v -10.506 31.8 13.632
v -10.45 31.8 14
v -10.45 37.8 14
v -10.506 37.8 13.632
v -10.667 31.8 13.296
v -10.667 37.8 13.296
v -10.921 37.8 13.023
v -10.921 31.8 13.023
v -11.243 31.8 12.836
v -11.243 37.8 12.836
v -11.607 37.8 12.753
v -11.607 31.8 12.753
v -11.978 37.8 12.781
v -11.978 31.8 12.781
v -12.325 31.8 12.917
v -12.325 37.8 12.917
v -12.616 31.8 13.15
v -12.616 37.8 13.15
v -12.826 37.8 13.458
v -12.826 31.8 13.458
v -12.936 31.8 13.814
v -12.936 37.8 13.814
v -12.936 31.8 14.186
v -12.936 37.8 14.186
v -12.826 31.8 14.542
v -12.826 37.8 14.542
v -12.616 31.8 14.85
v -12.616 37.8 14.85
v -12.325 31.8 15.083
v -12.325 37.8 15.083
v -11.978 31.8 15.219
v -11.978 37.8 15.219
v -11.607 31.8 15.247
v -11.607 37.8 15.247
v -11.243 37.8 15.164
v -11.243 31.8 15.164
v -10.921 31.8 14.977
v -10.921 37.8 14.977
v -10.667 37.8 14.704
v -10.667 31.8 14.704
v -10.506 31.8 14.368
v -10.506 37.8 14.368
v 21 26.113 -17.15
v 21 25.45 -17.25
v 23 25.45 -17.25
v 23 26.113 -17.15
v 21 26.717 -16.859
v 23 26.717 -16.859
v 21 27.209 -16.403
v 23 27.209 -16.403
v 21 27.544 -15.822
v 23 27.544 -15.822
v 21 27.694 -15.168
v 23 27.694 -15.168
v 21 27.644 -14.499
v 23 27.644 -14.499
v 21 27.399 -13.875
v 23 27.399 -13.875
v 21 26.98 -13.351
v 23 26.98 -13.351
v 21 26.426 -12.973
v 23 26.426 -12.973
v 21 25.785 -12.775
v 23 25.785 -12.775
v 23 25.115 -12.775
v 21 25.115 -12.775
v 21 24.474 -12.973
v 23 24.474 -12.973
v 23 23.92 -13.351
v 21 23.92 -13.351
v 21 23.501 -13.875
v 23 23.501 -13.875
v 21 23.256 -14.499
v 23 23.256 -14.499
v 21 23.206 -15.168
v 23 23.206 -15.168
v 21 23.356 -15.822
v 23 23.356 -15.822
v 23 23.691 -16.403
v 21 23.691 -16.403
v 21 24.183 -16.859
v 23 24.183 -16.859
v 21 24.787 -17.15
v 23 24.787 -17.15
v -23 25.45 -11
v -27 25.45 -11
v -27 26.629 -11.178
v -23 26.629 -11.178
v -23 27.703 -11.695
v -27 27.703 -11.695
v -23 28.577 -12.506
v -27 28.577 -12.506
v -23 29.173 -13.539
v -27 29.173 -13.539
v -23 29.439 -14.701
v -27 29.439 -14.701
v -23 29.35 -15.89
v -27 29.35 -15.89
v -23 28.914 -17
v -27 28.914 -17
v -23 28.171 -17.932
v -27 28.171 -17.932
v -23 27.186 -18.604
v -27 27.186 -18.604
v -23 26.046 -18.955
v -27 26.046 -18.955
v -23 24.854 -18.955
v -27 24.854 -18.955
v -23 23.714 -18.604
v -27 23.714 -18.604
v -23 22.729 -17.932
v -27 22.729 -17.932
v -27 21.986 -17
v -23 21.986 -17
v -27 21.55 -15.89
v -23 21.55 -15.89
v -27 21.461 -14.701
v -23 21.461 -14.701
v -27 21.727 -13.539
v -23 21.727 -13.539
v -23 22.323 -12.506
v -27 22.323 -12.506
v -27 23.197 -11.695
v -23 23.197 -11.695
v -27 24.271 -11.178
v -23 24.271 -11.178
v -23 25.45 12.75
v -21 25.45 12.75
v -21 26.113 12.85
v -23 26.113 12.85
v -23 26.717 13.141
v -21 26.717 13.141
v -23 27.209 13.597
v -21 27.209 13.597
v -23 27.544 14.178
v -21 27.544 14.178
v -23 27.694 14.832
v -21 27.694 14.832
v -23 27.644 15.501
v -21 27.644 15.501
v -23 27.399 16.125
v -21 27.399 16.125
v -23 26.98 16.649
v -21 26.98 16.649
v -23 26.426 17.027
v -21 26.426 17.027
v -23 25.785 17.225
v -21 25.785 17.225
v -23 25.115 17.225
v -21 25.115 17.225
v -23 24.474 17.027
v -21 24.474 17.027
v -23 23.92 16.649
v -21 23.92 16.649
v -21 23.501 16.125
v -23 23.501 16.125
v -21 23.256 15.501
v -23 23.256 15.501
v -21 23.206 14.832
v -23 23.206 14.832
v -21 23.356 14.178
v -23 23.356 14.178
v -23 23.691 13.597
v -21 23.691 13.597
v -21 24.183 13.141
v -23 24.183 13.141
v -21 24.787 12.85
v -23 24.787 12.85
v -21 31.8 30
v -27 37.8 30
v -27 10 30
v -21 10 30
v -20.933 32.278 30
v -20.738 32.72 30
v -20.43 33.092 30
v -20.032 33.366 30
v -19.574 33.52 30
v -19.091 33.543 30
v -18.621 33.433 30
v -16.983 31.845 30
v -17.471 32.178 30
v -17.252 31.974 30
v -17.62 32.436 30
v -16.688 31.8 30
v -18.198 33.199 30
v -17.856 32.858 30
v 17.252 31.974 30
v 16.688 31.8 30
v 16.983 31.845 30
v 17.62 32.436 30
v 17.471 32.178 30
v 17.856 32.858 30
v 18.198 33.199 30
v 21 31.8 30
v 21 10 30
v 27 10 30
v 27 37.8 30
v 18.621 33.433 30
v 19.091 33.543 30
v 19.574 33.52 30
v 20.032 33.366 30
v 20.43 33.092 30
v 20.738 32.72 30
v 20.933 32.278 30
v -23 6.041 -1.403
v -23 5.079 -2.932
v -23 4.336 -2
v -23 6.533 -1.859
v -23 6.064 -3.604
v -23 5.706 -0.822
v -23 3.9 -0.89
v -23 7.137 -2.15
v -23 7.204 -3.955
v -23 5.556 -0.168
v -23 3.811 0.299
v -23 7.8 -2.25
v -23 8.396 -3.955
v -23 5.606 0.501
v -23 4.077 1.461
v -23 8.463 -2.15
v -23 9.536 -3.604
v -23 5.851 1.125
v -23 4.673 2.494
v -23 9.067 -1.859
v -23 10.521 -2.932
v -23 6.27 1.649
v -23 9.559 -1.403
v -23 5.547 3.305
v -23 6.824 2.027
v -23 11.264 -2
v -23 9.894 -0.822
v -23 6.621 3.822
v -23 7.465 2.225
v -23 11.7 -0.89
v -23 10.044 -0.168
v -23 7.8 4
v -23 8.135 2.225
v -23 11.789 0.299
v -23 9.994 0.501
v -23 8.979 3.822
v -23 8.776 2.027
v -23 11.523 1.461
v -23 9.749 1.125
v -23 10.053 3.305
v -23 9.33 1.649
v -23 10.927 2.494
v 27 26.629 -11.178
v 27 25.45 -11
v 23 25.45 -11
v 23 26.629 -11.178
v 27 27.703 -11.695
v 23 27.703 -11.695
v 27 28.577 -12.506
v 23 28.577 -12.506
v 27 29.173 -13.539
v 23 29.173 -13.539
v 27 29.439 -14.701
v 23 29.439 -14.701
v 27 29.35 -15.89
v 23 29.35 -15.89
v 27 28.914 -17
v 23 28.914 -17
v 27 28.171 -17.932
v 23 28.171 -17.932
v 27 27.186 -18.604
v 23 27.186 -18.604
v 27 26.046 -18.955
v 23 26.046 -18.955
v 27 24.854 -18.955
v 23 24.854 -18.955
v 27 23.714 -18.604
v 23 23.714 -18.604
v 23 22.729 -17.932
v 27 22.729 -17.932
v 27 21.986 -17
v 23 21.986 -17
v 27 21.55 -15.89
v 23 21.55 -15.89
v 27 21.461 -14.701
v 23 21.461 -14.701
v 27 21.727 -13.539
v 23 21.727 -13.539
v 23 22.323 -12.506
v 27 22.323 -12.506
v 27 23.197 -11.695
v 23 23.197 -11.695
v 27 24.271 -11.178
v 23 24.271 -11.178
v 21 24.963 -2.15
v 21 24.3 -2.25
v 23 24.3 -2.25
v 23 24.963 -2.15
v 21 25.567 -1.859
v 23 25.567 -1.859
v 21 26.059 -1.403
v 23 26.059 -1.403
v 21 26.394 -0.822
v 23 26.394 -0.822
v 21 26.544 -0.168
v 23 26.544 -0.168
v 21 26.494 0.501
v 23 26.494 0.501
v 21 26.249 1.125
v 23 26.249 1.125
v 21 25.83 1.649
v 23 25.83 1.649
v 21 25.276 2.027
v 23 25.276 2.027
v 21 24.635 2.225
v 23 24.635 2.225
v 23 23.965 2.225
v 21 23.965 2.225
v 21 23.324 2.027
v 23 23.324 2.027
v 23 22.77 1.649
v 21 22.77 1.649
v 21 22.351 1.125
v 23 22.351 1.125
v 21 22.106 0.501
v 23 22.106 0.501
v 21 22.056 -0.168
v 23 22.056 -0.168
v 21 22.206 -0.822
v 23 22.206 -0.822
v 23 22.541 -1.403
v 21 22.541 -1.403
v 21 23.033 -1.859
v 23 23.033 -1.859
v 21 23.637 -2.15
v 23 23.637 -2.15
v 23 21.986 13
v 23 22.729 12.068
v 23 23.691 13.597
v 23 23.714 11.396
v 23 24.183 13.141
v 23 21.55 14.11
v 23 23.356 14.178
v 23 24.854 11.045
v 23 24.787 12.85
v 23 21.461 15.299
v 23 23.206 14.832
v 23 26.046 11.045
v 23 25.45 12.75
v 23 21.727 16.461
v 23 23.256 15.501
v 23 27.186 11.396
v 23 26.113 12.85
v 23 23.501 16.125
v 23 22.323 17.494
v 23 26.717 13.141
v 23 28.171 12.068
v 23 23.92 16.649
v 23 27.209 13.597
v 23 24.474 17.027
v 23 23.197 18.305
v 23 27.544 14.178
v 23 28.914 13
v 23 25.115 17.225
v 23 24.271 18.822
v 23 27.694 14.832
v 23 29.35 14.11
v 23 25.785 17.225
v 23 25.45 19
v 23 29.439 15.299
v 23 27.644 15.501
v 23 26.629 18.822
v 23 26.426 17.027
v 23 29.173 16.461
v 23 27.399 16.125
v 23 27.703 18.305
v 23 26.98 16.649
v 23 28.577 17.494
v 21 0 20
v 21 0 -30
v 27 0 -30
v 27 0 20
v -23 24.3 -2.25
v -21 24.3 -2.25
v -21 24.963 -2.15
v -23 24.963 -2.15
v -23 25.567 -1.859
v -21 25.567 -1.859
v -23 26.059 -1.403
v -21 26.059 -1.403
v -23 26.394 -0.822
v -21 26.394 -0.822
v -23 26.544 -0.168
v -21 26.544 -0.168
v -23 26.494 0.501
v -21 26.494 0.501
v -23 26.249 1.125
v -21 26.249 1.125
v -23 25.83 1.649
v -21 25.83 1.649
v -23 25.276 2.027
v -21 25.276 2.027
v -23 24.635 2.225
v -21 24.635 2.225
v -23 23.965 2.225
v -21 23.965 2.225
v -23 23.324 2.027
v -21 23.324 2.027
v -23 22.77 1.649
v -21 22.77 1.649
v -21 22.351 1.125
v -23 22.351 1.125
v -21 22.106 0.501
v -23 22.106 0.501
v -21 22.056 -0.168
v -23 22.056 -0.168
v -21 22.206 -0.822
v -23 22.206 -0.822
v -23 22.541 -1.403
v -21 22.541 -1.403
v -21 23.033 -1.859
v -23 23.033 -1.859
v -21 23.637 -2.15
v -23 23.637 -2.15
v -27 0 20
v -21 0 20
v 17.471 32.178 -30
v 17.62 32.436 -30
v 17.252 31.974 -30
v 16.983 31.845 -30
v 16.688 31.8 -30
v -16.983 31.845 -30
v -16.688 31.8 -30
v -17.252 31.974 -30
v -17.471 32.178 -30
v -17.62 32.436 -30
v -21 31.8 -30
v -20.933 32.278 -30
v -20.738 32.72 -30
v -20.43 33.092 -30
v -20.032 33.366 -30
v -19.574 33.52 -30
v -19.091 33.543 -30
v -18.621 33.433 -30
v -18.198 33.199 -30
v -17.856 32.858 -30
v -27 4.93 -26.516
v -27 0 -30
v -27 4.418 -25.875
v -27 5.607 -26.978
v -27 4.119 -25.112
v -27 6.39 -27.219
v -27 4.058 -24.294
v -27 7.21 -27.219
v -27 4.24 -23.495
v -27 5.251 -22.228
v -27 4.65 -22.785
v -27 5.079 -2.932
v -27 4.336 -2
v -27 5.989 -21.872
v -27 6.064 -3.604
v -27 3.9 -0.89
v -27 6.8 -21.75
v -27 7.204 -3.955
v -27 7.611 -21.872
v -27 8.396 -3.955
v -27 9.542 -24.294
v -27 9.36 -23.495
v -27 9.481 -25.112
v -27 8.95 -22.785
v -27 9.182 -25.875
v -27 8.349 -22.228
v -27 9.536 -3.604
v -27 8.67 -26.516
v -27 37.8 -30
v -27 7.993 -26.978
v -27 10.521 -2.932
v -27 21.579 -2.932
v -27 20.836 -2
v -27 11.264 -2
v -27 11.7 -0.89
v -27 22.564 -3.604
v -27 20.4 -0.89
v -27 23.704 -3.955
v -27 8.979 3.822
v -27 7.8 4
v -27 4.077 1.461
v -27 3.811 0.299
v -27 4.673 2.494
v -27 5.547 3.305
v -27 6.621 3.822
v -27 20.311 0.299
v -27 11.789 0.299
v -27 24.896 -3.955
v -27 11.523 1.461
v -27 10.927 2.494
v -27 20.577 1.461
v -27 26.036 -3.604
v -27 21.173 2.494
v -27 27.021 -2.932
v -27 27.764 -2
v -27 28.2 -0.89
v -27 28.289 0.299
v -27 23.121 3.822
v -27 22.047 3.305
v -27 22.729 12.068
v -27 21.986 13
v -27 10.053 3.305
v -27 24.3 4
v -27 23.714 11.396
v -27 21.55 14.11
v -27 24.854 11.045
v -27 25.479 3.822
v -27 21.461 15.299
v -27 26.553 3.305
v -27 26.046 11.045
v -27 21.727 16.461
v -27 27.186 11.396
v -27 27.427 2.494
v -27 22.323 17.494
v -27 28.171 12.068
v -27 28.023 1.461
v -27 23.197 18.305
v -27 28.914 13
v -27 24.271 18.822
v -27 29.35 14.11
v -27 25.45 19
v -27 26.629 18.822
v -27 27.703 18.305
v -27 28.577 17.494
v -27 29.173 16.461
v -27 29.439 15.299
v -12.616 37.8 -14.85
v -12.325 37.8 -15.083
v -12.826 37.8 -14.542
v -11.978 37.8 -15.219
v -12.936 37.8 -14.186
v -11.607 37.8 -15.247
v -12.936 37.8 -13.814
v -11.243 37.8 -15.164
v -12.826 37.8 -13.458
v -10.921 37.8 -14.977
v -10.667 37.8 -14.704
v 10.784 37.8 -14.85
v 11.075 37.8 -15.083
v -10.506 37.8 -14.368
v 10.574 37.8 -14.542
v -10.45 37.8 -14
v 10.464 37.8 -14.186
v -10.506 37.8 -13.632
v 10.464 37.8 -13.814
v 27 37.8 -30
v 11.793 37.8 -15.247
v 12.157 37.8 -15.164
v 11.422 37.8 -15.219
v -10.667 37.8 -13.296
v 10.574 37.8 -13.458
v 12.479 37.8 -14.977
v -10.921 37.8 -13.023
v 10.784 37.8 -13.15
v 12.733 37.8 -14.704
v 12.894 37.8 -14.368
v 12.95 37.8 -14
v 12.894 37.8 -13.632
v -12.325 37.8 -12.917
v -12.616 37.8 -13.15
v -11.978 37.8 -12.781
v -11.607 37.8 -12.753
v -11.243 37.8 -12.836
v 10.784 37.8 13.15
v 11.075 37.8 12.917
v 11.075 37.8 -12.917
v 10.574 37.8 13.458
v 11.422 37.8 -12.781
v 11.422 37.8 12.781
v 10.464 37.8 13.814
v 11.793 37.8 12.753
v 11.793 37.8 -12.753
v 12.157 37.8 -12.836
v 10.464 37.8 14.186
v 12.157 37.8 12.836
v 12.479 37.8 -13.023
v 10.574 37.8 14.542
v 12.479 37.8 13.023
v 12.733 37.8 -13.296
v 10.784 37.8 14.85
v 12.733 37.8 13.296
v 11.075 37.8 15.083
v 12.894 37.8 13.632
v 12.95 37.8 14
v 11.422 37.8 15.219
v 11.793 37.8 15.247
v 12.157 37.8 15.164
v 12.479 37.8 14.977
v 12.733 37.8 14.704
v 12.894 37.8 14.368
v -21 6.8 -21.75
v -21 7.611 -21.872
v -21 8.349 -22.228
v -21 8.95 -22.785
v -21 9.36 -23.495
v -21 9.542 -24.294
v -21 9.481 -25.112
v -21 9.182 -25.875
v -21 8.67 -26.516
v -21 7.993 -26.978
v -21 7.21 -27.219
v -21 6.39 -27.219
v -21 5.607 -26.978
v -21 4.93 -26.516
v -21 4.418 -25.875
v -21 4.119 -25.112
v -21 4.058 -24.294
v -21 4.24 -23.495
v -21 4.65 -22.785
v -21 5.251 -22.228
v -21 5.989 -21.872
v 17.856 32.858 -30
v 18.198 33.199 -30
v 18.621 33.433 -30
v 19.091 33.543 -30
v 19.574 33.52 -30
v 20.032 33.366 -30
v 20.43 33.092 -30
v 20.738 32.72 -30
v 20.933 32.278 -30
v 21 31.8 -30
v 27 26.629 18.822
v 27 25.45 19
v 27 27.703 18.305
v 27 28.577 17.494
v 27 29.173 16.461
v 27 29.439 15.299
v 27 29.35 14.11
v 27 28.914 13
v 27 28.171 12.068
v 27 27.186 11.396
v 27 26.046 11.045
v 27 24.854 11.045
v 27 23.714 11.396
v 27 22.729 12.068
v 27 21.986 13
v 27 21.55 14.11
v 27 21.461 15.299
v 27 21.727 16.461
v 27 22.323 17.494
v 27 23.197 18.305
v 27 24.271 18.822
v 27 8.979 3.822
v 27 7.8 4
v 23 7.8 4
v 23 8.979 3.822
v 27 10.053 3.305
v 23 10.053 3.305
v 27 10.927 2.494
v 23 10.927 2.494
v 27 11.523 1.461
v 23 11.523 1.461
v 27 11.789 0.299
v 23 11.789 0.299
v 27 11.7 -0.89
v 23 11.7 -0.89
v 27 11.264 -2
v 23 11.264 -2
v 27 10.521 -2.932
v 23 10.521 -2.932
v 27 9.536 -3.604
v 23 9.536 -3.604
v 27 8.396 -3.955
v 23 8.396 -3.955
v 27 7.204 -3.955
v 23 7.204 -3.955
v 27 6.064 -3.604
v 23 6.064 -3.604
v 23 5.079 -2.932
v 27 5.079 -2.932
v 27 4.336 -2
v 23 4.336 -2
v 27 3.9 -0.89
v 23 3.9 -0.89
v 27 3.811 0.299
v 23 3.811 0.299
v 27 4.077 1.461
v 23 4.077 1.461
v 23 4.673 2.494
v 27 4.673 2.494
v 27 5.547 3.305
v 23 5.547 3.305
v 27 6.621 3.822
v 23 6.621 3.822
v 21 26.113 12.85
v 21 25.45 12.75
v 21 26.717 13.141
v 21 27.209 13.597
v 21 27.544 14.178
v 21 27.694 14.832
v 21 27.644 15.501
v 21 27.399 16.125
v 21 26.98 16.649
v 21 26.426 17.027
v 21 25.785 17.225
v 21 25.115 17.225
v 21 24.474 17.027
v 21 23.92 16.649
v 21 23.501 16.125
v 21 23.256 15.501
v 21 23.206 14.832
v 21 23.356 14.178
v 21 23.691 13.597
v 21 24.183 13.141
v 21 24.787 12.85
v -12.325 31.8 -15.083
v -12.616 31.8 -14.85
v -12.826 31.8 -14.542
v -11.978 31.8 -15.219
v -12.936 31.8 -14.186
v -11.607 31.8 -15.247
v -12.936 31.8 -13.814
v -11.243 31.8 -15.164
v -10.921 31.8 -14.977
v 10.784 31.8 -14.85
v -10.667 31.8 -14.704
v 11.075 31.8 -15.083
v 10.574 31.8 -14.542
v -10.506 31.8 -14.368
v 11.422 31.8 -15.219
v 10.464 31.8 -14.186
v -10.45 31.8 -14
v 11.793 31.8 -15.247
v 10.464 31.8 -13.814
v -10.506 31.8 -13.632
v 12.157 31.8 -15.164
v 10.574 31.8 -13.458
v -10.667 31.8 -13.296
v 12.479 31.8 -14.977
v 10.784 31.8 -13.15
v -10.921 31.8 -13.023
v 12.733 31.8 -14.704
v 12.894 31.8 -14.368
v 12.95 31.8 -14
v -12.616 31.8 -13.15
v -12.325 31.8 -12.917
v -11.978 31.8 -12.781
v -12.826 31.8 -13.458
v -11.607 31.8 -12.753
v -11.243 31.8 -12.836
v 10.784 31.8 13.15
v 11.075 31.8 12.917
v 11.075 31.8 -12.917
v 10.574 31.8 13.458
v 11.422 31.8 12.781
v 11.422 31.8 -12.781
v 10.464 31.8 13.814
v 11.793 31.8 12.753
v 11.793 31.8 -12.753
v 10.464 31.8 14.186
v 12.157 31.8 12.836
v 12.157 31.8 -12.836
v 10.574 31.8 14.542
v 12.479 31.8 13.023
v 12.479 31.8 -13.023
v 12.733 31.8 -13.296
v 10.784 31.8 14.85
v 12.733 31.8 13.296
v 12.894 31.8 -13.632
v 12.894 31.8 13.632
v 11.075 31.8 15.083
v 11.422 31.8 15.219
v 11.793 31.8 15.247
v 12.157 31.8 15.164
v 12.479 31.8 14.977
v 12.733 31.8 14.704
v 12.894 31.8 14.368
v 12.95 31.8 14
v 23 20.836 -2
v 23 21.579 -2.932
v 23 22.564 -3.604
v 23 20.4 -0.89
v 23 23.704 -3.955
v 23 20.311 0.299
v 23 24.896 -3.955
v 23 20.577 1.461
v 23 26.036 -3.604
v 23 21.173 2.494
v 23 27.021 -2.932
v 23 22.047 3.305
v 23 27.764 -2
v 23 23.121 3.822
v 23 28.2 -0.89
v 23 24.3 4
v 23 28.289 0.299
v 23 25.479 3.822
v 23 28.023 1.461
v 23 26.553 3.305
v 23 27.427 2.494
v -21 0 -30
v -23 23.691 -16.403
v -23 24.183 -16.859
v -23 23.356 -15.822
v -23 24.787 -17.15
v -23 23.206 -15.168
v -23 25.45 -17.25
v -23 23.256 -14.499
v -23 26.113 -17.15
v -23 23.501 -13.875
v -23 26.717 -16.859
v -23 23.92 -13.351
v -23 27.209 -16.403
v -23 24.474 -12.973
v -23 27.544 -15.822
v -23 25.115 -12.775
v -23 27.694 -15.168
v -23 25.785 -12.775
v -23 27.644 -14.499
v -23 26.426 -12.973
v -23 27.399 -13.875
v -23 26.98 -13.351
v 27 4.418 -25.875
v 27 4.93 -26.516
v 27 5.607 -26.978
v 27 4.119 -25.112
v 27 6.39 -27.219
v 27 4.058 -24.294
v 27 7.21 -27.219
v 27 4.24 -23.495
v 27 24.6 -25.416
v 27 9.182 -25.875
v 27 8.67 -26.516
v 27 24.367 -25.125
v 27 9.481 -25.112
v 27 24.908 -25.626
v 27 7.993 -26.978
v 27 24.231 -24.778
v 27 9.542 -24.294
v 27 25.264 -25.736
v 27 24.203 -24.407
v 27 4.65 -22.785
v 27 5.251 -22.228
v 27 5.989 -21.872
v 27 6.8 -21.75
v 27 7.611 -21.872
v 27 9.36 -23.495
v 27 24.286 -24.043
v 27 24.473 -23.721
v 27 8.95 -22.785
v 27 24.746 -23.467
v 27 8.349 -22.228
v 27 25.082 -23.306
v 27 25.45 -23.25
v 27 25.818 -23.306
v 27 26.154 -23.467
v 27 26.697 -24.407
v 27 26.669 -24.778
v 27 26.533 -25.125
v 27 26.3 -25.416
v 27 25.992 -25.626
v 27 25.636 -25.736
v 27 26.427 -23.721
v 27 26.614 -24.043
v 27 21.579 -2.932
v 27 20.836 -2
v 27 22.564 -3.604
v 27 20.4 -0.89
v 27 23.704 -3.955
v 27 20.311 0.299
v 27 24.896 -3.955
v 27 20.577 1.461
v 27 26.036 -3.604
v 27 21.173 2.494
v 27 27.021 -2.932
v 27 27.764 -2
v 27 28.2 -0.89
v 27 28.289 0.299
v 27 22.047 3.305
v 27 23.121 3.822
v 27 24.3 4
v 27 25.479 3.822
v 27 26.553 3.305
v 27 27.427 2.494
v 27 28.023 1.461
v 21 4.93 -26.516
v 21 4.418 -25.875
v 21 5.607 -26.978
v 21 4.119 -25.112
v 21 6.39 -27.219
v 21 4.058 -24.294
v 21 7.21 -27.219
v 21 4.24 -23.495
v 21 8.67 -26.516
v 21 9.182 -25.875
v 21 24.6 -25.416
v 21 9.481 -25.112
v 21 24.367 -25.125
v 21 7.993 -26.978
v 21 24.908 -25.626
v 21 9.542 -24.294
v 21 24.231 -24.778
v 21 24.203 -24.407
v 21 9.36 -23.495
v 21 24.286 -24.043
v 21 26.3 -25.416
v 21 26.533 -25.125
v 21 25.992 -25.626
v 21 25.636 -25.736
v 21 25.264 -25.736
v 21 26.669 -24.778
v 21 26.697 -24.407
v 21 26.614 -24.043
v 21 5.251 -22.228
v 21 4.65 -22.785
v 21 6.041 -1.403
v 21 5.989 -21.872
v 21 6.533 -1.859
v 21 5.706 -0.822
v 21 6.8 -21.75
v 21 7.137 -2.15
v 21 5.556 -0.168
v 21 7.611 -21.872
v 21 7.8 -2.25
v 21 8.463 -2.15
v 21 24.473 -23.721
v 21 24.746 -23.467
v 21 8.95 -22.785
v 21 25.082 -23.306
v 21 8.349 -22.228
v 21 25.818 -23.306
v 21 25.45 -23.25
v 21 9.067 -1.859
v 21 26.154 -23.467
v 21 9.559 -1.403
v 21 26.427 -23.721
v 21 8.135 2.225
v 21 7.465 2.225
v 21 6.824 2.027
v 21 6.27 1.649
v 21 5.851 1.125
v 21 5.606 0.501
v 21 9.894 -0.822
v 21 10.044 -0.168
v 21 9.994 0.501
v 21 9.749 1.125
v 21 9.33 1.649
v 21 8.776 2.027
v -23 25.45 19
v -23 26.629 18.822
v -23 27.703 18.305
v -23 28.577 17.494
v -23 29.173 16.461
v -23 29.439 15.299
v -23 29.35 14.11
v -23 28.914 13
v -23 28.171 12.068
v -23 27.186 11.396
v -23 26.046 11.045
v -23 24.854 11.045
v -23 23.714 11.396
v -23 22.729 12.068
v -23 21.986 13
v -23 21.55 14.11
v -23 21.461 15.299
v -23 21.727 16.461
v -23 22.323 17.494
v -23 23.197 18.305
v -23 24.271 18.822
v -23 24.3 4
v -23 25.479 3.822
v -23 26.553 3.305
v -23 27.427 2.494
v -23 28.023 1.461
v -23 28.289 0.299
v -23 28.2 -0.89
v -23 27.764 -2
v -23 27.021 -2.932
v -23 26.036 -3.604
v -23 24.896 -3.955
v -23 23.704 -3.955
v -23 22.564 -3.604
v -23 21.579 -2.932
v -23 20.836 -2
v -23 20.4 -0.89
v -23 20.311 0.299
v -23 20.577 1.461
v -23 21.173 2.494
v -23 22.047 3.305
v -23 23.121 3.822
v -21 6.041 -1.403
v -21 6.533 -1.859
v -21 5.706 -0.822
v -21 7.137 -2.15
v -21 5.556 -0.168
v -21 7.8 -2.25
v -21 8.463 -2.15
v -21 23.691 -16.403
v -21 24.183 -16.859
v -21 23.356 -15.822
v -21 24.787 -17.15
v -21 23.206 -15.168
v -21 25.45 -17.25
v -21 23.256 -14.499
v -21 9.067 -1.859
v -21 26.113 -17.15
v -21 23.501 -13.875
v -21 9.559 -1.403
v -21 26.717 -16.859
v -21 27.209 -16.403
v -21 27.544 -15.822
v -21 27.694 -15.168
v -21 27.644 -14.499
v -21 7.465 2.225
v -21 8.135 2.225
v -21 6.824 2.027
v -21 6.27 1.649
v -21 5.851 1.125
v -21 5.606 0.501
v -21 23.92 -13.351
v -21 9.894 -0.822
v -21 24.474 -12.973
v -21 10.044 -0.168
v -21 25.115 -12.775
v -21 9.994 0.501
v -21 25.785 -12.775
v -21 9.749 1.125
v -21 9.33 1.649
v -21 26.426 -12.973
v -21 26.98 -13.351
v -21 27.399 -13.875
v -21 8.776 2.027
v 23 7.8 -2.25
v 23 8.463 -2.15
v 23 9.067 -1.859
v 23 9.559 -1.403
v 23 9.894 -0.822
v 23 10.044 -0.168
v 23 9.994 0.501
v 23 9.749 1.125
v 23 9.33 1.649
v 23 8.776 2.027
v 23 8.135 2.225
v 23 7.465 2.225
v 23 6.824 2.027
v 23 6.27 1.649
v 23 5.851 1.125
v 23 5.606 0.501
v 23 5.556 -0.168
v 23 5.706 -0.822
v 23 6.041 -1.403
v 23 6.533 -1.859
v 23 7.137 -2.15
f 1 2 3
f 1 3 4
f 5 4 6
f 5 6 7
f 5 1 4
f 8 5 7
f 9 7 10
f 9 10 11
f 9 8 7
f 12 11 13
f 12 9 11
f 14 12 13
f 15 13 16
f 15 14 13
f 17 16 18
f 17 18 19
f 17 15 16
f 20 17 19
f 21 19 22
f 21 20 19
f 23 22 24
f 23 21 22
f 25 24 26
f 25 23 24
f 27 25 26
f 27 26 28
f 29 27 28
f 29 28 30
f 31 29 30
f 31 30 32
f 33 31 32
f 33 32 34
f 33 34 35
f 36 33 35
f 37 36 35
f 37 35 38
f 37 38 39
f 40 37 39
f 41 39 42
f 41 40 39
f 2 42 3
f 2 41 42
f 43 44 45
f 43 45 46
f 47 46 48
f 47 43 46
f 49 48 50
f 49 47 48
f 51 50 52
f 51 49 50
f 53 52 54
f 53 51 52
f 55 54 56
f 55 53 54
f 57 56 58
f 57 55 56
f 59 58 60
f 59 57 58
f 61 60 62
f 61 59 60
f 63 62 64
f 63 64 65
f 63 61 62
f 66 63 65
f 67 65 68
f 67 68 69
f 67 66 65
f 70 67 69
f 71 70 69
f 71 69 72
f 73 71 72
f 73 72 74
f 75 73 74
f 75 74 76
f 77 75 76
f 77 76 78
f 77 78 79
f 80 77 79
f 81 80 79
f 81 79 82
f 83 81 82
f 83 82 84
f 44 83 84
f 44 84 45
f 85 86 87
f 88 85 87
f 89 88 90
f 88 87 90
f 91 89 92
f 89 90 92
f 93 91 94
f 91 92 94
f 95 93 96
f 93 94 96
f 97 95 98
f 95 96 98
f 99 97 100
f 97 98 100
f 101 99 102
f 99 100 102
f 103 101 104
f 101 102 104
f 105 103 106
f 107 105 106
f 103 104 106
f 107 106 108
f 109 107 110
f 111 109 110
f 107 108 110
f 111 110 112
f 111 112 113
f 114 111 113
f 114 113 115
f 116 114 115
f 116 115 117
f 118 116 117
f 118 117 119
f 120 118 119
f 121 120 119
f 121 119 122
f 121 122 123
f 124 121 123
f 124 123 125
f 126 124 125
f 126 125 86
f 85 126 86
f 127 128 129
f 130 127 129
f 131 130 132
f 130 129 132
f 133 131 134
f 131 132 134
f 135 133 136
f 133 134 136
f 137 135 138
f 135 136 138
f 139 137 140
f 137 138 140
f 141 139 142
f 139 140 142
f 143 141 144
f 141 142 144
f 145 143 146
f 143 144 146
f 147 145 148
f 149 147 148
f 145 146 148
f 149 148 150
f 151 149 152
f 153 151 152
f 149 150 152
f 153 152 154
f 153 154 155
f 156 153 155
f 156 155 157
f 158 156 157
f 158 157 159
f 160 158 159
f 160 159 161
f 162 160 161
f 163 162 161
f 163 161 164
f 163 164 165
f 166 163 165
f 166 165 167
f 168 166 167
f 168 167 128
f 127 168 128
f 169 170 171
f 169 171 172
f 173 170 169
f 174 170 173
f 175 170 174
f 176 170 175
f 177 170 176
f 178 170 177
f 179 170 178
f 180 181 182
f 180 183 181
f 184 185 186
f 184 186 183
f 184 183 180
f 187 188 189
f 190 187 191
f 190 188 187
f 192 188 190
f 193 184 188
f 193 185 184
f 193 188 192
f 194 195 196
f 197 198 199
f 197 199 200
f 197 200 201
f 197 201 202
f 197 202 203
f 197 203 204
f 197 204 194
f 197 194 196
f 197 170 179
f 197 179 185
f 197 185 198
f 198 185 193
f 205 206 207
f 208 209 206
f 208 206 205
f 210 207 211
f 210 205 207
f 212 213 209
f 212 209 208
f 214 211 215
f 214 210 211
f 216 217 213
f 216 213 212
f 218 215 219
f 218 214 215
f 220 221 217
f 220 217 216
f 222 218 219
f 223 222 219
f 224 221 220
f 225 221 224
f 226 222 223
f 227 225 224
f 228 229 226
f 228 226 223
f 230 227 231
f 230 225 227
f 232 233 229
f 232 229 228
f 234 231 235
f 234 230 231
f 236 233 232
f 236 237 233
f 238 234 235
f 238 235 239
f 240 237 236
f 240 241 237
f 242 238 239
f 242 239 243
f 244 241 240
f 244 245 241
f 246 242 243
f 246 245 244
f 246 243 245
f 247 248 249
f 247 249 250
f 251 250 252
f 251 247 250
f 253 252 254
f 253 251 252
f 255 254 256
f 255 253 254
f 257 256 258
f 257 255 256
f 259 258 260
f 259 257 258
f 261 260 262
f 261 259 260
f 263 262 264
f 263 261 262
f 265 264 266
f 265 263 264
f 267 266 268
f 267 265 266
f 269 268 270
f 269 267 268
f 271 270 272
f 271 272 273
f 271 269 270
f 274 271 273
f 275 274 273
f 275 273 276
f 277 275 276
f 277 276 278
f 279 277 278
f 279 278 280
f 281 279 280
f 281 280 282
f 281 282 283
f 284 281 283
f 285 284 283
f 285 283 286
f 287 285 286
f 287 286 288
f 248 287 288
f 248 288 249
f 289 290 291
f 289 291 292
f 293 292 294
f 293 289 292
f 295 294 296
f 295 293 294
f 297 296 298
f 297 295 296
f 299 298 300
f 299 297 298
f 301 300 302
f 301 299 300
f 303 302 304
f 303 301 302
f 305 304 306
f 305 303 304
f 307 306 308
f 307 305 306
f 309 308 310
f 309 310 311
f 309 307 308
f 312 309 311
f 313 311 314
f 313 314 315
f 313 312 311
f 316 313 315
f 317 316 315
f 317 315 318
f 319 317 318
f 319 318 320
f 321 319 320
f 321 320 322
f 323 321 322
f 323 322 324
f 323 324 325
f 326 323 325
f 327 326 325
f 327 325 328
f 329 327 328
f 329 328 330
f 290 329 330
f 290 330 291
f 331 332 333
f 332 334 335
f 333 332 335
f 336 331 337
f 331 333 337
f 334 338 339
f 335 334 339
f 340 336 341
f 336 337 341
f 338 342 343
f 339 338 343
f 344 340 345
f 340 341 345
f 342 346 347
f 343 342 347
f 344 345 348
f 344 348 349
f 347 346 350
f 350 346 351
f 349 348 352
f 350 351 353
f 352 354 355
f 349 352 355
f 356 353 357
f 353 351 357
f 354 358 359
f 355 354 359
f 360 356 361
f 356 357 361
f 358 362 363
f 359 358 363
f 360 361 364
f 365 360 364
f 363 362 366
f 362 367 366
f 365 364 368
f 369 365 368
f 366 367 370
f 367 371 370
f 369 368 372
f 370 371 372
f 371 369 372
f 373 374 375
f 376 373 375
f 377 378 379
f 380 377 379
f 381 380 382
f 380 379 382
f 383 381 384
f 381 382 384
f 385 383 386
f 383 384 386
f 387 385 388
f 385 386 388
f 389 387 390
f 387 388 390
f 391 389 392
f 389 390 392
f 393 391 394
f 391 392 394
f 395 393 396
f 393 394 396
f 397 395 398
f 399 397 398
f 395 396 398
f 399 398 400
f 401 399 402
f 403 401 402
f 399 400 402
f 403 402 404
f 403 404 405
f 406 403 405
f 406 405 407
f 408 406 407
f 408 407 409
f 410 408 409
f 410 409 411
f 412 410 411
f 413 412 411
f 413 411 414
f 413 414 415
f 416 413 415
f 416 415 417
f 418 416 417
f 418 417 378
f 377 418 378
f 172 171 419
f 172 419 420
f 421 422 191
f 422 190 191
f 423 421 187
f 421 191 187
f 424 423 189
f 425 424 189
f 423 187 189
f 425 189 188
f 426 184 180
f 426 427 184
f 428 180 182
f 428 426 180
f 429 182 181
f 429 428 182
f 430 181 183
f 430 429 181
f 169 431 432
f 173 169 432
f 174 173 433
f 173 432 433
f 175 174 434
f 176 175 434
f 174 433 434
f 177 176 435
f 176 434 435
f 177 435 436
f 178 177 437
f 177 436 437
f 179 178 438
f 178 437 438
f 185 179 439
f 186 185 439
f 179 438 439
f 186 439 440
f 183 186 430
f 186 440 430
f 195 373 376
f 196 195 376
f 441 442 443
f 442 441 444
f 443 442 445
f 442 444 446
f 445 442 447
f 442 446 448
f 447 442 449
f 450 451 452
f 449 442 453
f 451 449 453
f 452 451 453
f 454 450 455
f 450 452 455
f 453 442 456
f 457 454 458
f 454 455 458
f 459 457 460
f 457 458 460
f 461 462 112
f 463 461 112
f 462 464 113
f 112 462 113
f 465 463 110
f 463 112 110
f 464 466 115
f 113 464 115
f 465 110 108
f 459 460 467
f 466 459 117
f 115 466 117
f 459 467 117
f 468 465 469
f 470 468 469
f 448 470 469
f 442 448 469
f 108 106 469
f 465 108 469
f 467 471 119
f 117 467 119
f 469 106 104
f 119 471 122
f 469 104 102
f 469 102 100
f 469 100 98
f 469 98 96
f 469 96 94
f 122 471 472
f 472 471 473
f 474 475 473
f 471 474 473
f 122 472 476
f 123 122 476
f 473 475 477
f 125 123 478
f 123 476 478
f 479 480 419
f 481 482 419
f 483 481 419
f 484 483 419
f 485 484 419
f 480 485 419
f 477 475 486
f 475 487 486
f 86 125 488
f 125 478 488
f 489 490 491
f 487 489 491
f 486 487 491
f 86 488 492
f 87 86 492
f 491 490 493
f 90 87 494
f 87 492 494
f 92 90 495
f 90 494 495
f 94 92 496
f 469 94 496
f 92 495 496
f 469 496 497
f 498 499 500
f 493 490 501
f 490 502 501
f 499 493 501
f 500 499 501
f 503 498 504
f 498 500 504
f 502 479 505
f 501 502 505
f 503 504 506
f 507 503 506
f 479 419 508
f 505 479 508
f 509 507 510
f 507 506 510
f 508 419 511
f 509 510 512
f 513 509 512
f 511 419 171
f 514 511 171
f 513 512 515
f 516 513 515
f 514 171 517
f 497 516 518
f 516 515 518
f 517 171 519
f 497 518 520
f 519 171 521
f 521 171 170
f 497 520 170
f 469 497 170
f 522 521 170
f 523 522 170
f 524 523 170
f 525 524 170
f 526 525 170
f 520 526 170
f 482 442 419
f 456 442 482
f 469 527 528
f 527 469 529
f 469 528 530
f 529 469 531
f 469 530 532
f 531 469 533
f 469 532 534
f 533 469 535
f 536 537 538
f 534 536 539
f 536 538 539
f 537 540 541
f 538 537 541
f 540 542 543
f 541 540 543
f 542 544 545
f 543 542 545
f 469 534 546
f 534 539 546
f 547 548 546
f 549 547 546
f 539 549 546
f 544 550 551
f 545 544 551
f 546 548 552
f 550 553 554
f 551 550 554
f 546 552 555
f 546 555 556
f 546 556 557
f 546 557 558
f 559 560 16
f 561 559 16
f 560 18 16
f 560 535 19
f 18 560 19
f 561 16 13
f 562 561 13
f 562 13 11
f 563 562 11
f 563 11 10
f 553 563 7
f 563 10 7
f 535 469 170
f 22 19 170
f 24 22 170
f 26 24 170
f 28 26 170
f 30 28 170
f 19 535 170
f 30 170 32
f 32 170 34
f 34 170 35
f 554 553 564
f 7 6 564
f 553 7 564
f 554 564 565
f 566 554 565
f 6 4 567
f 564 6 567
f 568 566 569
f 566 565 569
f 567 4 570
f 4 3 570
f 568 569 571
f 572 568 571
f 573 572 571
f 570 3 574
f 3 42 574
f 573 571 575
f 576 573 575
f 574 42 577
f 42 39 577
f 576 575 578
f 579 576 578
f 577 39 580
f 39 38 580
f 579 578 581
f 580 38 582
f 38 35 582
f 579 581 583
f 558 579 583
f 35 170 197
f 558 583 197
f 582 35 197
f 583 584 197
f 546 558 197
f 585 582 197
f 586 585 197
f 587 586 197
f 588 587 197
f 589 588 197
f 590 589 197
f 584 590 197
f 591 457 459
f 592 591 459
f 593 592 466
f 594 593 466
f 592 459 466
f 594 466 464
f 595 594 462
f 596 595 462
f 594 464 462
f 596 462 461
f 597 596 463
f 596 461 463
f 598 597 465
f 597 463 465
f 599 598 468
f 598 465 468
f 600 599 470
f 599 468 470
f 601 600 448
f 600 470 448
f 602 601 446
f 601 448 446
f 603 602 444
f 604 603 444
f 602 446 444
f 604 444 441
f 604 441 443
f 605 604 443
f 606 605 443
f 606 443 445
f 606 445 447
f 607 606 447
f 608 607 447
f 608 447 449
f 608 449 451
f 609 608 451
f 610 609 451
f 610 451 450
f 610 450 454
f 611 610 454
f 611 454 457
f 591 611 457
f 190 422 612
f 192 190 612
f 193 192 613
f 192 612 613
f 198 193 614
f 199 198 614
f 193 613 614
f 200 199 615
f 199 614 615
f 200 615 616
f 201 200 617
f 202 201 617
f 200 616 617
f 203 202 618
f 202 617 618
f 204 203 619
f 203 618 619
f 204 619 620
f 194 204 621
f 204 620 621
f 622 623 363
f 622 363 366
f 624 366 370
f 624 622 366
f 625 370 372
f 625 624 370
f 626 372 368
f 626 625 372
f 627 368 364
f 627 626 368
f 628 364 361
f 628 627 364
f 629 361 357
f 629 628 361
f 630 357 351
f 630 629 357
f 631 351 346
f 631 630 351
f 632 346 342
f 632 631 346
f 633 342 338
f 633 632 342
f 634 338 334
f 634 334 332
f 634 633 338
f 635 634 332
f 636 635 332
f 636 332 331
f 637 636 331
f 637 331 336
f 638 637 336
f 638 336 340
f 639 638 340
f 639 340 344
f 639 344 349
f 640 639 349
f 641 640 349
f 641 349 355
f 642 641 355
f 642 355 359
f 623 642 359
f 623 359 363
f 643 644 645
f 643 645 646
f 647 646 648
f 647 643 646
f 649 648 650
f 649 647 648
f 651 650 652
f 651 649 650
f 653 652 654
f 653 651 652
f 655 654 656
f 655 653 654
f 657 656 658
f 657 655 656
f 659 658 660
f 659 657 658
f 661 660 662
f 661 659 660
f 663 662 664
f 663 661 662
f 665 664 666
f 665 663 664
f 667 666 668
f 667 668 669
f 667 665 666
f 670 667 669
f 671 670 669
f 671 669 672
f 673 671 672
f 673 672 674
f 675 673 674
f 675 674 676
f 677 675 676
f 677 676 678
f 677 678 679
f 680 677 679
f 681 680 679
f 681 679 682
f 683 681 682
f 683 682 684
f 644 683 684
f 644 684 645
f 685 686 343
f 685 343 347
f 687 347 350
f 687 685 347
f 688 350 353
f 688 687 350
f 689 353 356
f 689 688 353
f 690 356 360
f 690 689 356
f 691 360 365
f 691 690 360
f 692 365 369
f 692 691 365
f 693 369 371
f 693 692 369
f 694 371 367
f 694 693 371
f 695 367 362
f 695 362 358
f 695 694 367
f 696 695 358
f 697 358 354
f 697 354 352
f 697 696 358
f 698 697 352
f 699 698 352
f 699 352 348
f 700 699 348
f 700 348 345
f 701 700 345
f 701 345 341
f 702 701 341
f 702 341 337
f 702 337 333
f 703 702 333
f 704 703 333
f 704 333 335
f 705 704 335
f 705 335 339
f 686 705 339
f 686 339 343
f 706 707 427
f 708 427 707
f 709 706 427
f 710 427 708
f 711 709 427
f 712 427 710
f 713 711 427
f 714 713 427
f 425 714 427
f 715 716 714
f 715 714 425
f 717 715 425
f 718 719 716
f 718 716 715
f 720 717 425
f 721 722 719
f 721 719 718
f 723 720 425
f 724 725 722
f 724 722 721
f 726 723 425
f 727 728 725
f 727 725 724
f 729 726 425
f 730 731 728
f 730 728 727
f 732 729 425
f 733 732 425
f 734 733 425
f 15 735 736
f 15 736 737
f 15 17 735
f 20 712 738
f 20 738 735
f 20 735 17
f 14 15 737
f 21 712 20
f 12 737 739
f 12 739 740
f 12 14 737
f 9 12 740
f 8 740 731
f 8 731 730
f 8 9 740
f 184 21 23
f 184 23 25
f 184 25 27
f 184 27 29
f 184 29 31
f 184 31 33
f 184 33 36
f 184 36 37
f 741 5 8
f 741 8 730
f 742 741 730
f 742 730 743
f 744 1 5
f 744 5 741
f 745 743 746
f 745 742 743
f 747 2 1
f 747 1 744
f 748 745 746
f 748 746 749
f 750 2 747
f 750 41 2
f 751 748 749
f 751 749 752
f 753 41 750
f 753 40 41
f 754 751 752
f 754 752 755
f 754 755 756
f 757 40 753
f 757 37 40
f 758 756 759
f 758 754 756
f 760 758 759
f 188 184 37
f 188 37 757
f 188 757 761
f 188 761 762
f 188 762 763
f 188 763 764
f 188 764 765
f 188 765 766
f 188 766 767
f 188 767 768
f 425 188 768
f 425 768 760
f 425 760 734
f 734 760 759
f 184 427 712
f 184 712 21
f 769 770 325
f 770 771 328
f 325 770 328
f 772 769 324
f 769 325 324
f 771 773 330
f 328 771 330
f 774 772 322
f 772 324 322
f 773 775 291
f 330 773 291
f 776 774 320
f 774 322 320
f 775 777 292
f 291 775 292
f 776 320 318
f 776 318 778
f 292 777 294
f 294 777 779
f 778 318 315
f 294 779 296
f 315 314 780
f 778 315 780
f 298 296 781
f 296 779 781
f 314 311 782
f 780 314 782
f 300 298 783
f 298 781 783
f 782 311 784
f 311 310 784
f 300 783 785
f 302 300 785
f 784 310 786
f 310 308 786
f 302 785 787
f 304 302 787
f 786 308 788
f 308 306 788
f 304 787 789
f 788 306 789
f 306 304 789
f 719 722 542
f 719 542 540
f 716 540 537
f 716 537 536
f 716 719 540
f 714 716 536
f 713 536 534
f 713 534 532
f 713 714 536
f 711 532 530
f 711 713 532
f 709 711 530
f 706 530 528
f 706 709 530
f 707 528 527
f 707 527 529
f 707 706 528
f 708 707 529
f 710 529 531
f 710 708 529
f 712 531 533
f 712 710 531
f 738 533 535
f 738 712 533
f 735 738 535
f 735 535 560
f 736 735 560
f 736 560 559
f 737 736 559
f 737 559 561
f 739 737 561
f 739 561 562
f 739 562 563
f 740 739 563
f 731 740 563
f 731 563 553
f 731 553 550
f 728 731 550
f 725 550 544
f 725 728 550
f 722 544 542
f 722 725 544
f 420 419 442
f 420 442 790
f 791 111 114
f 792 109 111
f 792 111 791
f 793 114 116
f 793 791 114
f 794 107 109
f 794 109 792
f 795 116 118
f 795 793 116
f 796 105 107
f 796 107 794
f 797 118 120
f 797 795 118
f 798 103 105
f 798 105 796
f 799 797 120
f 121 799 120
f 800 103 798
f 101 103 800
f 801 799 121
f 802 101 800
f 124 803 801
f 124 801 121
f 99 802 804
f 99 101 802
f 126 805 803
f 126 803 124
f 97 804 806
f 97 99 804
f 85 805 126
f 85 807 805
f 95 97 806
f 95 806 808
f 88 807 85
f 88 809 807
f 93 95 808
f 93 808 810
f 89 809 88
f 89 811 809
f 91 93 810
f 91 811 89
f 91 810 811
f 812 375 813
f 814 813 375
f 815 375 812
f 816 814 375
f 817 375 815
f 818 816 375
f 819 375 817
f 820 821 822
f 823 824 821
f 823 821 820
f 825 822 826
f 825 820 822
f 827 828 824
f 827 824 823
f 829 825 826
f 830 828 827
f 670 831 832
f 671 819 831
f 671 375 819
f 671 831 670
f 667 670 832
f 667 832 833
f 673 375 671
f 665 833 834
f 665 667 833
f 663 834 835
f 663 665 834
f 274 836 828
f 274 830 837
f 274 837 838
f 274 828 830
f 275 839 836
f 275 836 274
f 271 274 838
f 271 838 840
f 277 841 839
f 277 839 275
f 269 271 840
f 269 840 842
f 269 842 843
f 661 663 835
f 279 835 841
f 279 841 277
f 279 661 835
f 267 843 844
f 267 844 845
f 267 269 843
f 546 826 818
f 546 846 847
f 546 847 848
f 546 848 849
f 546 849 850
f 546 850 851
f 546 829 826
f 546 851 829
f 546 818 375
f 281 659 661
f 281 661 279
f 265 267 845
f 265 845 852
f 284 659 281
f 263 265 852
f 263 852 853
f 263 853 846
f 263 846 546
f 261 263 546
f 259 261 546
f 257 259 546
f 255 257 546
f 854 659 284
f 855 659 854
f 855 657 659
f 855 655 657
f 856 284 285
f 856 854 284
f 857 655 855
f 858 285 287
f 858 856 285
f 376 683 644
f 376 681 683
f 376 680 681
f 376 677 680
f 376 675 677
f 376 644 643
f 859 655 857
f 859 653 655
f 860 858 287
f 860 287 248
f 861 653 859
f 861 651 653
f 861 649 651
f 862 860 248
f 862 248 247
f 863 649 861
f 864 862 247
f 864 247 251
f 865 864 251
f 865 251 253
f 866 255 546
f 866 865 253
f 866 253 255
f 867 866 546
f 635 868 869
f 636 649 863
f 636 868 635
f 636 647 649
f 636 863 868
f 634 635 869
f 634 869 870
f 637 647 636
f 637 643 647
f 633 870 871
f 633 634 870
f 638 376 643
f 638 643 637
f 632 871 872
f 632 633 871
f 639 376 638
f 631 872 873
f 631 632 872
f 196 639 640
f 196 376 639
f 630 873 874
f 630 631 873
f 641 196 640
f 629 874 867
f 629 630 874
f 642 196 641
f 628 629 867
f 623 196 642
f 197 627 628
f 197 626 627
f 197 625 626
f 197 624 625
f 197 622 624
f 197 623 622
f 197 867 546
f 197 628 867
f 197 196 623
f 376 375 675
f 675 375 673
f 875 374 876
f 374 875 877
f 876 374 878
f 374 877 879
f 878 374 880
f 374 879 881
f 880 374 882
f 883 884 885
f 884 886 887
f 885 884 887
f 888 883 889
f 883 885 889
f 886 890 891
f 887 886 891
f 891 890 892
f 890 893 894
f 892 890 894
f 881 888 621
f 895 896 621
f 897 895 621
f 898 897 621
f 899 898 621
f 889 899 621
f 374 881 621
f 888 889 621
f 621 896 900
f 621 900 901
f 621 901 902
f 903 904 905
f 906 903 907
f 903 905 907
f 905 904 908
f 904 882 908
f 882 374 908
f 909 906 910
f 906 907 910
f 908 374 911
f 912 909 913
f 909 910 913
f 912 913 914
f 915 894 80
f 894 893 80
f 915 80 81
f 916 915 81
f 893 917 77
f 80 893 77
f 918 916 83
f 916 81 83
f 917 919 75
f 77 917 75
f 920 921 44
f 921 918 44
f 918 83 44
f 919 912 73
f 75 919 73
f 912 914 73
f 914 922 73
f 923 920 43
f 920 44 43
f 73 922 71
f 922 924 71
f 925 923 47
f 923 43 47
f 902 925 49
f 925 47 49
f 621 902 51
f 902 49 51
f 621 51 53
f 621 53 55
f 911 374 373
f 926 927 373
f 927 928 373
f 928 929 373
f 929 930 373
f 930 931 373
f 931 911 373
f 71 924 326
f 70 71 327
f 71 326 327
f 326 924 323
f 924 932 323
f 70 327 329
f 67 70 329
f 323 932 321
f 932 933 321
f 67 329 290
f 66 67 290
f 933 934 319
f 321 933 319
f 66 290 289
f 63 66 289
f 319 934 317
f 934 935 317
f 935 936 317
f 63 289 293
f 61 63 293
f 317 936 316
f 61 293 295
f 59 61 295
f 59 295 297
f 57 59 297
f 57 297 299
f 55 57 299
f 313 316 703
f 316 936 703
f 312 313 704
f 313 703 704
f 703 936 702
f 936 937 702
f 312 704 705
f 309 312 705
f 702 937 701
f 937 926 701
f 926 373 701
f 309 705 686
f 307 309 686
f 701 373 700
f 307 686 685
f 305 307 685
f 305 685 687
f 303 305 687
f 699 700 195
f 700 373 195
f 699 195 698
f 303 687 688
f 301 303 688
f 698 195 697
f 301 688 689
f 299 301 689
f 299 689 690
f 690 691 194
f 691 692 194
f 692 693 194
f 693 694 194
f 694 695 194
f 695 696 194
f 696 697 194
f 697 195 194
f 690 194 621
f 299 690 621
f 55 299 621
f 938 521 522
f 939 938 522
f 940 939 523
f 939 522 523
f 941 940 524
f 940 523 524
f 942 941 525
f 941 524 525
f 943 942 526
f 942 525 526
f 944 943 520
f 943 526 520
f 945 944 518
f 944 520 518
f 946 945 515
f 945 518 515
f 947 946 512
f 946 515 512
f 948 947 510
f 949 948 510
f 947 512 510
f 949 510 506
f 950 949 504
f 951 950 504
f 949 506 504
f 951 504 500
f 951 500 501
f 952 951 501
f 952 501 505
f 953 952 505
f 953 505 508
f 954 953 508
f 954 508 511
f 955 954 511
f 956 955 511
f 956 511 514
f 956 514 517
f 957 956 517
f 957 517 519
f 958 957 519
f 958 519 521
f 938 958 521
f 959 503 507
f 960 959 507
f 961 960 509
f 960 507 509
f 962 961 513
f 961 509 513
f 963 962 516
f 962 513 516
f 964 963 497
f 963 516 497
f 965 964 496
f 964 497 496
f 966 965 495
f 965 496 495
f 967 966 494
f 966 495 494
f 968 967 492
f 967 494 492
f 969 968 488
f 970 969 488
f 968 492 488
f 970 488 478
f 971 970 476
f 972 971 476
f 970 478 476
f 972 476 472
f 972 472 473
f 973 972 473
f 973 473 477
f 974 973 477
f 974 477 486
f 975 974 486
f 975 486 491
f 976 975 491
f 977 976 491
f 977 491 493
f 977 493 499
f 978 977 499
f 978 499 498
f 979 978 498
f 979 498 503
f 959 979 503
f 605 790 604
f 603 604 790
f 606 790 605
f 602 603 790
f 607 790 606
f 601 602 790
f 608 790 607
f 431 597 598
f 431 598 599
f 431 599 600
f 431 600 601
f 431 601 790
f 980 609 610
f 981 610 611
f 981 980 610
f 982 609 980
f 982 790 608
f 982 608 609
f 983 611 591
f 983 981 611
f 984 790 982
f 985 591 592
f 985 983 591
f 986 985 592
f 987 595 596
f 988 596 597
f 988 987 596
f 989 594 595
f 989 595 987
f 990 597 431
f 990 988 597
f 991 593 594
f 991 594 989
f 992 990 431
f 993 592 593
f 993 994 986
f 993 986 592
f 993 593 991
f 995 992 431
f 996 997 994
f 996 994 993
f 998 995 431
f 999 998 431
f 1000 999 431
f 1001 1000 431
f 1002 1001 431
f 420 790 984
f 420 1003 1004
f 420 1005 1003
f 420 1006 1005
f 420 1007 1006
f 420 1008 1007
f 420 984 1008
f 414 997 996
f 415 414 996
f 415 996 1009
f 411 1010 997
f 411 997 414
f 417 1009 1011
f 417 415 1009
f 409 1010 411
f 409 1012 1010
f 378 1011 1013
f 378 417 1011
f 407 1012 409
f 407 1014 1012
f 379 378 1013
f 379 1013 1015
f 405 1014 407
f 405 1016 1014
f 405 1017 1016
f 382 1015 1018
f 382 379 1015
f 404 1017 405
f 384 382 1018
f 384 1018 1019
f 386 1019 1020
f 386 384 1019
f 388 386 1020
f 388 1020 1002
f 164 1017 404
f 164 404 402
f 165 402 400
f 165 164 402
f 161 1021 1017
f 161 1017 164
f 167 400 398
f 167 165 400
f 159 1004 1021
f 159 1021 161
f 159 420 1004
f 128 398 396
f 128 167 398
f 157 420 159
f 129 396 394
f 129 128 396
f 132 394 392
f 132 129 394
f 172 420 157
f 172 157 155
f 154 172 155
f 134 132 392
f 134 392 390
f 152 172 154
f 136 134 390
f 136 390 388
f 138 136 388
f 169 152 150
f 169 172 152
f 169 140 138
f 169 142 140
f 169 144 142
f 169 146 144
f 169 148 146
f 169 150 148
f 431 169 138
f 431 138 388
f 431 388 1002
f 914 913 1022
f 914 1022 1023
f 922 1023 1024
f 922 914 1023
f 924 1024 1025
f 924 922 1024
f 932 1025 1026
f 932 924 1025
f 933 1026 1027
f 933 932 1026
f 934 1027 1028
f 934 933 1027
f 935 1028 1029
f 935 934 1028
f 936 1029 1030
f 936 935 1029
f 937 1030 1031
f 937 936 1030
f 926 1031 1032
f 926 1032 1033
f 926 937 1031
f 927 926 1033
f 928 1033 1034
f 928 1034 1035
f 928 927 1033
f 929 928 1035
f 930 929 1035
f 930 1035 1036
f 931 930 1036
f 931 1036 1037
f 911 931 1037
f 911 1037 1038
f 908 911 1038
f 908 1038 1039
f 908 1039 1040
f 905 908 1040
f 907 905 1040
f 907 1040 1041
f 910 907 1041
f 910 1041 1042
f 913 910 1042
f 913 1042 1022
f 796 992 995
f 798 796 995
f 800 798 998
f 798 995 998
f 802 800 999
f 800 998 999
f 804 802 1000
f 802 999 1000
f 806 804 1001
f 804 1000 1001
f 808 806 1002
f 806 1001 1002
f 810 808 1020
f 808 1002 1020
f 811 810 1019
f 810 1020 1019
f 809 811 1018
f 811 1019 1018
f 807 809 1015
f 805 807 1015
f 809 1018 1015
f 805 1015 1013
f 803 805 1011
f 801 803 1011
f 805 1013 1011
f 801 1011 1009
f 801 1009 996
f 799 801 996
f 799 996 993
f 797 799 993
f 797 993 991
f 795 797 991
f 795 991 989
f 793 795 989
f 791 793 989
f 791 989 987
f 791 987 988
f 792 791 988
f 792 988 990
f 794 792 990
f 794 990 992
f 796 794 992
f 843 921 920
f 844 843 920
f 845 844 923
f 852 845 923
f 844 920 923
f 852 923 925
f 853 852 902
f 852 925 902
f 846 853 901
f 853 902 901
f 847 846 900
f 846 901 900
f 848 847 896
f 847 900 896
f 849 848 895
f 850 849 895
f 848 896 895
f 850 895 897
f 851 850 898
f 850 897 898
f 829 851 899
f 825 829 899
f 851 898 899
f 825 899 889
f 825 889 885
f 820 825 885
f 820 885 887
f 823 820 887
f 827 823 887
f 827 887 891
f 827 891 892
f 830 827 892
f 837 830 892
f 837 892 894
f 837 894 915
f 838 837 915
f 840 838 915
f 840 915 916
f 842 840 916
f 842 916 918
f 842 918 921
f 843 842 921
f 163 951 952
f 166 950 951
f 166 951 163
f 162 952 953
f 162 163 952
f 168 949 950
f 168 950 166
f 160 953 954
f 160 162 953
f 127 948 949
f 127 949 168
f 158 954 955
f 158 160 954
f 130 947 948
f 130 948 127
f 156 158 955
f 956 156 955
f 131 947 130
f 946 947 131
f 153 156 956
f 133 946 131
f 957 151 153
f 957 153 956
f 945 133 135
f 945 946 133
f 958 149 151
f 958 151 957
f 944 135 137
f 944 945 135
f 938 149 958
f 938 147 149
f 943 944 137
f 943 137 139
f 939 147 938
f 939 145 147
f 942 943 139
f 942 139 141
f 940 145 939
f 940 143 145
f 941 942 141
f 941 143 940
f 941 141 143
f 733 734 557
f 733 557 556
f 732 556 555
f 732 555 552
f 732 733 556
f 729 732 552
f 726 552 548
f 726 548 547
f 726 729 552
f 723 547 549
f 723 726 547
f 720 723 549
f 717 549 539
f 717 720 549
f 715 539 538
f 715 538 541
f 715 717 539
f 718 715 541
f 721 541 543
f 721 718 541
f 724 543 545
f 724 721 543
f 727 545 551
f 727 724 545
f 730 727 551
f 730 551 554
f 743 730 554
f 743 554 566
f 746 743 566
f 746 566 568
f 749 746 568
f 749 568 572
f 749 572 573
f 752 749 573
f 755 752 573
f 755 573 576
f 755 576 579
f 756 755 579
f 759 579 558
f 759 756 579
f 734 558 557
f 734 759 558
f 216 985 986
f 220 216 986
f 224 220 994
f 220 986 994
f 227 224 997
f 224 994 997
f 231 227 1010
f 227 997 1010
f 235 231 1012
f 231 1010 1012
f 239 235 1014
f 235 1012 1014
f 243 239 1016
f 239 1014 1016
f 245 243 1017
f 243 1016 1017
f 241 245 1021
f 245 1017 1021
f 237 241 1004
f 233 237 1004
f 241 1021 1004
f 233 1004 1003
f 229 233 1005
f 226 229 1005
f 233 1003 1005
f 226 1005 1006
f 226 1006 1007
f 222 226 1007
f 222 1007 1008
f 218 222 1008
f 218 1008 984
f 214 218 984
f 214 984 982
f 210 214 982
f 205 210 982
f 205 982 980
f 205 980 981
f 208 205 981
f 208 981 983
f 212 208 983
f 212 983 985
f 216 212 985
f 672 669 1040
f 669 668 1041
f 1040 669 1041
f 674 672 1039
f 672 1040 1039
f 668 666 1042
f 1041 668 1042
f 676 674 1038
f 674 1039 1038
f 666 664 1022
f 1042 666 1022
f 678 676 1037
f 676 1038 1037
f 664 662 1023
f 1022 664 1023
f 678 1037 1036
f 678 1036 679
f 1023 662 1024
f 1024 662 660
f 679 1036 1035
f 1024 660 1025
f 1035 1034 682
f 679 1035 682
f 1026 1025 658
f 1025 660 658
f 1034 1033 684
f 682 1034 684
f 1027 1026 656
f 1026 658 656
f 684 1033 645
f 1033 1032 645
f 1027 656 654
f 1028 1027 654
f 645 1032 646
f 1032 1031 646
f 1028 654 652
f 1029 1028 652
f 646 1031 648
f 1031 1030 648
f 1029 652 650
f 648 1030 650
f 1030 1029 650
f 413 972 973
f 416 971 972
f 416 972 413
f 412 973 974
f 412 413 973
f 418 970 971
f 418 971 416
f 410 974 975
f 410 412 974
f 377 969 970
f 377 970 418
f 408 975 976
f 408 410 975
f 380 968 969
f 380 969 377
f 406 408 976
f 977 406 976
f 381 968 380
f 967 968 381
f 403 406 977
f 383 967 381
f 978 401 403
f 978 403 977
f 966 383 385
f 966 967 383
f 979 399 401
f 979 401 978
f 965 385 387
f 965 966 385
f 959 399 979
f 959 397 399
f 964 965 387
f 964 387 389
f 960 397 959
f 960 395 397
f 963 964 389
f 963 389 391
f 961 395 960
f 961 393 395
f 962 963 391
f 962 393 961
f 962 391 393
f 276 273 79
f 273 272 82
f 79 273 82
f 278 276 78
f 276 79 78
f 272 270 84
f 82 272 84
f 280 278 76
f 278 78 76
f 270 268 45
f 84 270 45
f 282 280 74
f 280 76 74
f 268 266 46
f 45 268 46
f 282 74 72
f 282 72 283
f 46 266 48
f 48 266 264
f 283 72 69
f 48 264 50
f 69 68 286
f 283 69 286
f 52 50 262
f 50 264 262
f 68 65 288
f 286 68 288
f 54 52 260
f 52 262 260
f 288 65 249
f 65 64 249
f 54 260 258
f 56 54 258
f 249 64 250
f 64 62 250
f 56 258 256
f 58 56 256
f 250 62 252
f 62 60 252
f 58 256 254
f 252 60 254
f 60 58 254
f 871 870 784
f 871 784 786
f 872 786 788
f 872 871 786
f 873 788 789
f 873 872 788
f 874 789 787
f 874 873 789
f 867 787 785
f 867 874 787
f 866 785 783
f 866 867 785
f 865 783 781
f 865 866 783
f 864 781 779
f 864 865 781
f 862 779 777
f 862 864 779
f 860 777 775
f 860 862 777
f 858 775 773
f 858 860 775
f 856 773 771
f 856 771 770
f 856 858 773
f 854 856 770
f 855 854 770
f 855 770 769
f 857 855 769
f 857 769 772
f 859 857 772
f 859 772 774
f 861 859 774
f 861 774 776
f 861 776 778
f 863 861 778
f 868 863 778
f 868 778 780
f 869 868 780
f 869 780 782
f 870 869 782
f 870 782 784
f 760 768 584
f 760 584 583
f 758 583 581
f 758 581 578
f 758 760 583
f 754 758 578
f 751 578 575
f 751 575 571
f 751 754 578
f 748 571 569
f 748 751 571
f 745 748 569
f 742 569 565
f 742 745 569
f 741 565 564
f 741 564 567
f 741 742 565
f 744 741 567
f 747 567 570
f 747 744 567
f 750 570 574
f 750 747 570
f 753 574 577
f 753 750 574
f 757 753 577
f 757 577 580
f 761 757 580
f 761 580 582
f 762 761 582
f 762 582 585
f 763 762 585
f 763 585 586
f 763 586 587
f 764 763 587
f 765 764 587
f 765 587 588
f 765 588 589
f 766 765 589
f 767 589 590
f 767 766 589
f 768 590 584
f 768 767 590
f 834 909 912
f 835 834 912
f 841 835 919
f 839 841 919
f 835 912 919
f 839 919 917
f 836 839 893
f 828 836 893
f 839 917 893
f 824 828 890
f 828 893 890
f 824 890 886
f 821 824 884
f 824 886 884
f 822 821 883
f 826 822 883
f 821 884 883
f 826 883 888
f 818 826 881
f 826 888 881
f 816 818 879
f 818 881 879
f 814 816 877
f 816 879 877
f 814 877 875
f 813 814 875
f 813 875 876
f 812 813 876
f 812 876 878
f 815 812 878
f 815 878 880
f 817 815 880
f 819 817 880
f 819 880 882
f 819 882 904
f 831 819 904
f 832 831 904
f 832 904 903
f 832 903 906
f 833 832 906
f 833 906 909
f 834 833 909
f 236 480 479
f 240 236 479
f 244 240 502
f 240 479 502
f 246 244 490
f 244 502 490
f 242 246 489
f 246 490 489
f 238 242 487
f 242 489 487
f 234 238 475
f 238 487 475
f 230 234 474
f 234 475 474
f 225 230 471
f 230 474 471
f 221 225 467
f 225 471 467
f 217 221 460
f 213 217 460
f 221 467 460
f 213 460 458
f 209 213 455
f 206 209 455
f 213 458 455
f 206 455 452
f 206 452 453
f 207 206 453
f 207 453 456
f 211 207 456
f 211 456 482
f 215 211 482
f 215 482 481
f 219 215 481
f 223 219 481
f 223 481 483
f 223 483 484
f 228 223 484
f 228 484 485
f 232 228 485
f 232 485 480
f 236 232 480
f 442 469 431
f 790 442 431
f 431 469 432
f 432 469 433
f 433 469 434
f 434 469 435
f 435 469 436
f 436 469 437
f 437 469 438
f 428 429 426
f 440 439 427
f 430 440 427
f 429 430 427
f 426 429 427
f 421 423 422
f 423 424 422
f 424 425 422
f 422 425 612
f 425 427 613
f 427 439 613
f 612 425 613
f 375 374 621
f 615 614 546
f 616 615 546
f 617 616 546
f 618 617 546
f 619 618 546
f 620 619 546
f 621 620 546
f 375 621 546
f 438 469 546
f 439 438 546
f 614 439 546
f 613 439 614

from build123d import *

# Parameters (mm, degrees)
SKETCH1_W                      = 54
SKETCH1_H                      = 37.8
BOSS_EXTRUDE1_DEPTH            = 30
SKETCH2_W                      = 42
SKETCH2_H                      = 31.8
CUT_EXTRUDE1_DEPTH             = 76.88043226
CBORE_FOR_M4_SHCS1_D           = 4.5
CBORE_FOR_M4_SHCS1_DEPTH       = 6
CBORE_FOR_M4_SHCS1_CBORE_D     = 8
CBORE_FOR_M4_SHCS1_CBORE_DEPTH = 4
M3X0_5_START                   = 31.8
M3X0_5_TAPPED_HOLE_OUTLINE_R   = 1.25
M3X0_5_TAPPED_HOLE_DEPTH       = 6
CHAMFER1_SIZE                  = 10
M5_CLEARANCE_HOLE1_D           = 5.5
M3X0_5_TAPPED_HOLE1_D          = 2.5
M3X0_5_TAPPED_HOLE1_DEPTH      = 6
SKETCH11_R                     = 1.75
CUT_EXTRUDE2_DEPTH             = 76.88043226
FILLET1_R                      = 1


# Read off the part's stored shape, not the designer's step: M3x0.5 Tapped Hole
with BuildPart() as part:
    # Sketch1 → Boss-Extrude1 (new, symmetric)
    with BuildSketch(Plane.XY):
        with Locations((0, 18.9)):
            Rectangle(SKETCH1_W, SKETCH1_H)
    extrude(amount=BOSS_EXTRUDE1_DEPTH, both=True)

    # Sketch2 → Cut-Extrude1 (cut, through all)
    with BuildSketch(Plane.XY.offset(30)):
        with Locations((0, 15.9)):
            Rectangle(SKETCH2_W, SKETCH2_H)
    extrude(amount=-CUT_EXTRUDE1_DEPTH, mode=Mode.SUBTRACT)

    # CBORE for M4 SHCS1
    with Locations(Plane.ZY.offset(27)):
        with Locations((15, 25.45), (0, 24.3), (0, 7.8), (-15, 25.45)):
            cbore_for_m4_shcs1 = CounterBoreHole(CBORE_FOR_M4_SHCS1_D / 2, CBORE_FOR_M4_SHCS1_CBORE_D / 2, CBORE_FOR_M4_SHCS1_CBORE_DEPTH, depth=CBORE_FOR_M4_SHCS1_DEPTH)

    # M3x0.5 Tapped Hole outline → M3x0.5 Tapped Hole (cut)
    with BuildSketch(Plane(origin=(0, 0, 0), x_dir=(1, 0, 0), z_dir=(0, 1, 0)).offset(M3X0_5_START)):
        with Locations((11.7, -14)):
            Circle(M3X0_5_TAPPED_HOLE_OUTLINE_R)
        with Locations((-11.7, 14)):
            Circle(M3X0_5_TAPPED_HOLE_OUTLINE_R)
        with Locations((-11.7, -14)):
            Circle(M3X0_5_TAPPED_HOLE_OUTLINE_R)
        with Locations((11.7, 14)):
            Circle(M3X0_5_TAPPED_HOLE_OUTLINE_R)
    extrude(amount=M3X0_5_TAPPED_HOLE_DEPTH, mode=Mode.SUBTRACT)

    # Chamfer1
    chamfer1_edges = [part.edges().sort_by_distance(p)[0] for p in [
        (24, 0, 30),
        (-24, 0, 30),
    ]]
    chamfer(chamfer1_edges, length=CHAMFER1_SIZE)

    # Mirror1: CBORE for M4 SHCS1 across plane
    add(cbore_for_m4_shcs1.mirror(Plane(origin=(0, 0, 0), x_dir=(0, 0, 1), z_dir=(1, 0, 0))), mode=Mode.SUBTRACT)

    # M5 Clearance Hole1 (through all)
    with Locations(Plane(origin=(27, 0, 0), x_dir=(0, 0, -1), z_dir=(1, 0, 0))):
        with Locations((24.5, 6.8)):
            Hole(M5_CLEARANCE_HOLE1_D / 2)

    # M3x0.5 Tapped Hole1
    with Locations(Plane(origin=(27, 0, 0), x_dir=(0, 0, -1), z_dir=(1, 0, 0))):
        with Locations((24.5, 25.45)):
            Hole(M3X0_5_TAPPED_HOLE1_D / 2, depth=M3X0_5_TAPPED_HOLE1_DEPTH)

    # Sketch11 → Cut-Extrude2 (cut, through all)
    with BuildSketch(Plane(origin=(0, 0, -30), x_dir=(-1, 0, 0), z_dir=(0, 0, -1))):
        with Locations((-19.25, 31.8)):
            Circle(SKETCH11_R)
        with Locations((19.25, 31.8)):
            Circle(SKETCH11_R)
    extrude(amount=-CUT_EXTRUDE2_DEPTH, mode=Mode.SUBTRACT)

    # Fillet1
    fillet1_edges = [part.edges().sort_by_distance(p)[0] for p in [
        (-17.5, 31.8, 0),
        (17.5, 31.8, 0),
    ]]
    fillet(fillet1_edges, radius=FILLET1_R)


solid = part.part
